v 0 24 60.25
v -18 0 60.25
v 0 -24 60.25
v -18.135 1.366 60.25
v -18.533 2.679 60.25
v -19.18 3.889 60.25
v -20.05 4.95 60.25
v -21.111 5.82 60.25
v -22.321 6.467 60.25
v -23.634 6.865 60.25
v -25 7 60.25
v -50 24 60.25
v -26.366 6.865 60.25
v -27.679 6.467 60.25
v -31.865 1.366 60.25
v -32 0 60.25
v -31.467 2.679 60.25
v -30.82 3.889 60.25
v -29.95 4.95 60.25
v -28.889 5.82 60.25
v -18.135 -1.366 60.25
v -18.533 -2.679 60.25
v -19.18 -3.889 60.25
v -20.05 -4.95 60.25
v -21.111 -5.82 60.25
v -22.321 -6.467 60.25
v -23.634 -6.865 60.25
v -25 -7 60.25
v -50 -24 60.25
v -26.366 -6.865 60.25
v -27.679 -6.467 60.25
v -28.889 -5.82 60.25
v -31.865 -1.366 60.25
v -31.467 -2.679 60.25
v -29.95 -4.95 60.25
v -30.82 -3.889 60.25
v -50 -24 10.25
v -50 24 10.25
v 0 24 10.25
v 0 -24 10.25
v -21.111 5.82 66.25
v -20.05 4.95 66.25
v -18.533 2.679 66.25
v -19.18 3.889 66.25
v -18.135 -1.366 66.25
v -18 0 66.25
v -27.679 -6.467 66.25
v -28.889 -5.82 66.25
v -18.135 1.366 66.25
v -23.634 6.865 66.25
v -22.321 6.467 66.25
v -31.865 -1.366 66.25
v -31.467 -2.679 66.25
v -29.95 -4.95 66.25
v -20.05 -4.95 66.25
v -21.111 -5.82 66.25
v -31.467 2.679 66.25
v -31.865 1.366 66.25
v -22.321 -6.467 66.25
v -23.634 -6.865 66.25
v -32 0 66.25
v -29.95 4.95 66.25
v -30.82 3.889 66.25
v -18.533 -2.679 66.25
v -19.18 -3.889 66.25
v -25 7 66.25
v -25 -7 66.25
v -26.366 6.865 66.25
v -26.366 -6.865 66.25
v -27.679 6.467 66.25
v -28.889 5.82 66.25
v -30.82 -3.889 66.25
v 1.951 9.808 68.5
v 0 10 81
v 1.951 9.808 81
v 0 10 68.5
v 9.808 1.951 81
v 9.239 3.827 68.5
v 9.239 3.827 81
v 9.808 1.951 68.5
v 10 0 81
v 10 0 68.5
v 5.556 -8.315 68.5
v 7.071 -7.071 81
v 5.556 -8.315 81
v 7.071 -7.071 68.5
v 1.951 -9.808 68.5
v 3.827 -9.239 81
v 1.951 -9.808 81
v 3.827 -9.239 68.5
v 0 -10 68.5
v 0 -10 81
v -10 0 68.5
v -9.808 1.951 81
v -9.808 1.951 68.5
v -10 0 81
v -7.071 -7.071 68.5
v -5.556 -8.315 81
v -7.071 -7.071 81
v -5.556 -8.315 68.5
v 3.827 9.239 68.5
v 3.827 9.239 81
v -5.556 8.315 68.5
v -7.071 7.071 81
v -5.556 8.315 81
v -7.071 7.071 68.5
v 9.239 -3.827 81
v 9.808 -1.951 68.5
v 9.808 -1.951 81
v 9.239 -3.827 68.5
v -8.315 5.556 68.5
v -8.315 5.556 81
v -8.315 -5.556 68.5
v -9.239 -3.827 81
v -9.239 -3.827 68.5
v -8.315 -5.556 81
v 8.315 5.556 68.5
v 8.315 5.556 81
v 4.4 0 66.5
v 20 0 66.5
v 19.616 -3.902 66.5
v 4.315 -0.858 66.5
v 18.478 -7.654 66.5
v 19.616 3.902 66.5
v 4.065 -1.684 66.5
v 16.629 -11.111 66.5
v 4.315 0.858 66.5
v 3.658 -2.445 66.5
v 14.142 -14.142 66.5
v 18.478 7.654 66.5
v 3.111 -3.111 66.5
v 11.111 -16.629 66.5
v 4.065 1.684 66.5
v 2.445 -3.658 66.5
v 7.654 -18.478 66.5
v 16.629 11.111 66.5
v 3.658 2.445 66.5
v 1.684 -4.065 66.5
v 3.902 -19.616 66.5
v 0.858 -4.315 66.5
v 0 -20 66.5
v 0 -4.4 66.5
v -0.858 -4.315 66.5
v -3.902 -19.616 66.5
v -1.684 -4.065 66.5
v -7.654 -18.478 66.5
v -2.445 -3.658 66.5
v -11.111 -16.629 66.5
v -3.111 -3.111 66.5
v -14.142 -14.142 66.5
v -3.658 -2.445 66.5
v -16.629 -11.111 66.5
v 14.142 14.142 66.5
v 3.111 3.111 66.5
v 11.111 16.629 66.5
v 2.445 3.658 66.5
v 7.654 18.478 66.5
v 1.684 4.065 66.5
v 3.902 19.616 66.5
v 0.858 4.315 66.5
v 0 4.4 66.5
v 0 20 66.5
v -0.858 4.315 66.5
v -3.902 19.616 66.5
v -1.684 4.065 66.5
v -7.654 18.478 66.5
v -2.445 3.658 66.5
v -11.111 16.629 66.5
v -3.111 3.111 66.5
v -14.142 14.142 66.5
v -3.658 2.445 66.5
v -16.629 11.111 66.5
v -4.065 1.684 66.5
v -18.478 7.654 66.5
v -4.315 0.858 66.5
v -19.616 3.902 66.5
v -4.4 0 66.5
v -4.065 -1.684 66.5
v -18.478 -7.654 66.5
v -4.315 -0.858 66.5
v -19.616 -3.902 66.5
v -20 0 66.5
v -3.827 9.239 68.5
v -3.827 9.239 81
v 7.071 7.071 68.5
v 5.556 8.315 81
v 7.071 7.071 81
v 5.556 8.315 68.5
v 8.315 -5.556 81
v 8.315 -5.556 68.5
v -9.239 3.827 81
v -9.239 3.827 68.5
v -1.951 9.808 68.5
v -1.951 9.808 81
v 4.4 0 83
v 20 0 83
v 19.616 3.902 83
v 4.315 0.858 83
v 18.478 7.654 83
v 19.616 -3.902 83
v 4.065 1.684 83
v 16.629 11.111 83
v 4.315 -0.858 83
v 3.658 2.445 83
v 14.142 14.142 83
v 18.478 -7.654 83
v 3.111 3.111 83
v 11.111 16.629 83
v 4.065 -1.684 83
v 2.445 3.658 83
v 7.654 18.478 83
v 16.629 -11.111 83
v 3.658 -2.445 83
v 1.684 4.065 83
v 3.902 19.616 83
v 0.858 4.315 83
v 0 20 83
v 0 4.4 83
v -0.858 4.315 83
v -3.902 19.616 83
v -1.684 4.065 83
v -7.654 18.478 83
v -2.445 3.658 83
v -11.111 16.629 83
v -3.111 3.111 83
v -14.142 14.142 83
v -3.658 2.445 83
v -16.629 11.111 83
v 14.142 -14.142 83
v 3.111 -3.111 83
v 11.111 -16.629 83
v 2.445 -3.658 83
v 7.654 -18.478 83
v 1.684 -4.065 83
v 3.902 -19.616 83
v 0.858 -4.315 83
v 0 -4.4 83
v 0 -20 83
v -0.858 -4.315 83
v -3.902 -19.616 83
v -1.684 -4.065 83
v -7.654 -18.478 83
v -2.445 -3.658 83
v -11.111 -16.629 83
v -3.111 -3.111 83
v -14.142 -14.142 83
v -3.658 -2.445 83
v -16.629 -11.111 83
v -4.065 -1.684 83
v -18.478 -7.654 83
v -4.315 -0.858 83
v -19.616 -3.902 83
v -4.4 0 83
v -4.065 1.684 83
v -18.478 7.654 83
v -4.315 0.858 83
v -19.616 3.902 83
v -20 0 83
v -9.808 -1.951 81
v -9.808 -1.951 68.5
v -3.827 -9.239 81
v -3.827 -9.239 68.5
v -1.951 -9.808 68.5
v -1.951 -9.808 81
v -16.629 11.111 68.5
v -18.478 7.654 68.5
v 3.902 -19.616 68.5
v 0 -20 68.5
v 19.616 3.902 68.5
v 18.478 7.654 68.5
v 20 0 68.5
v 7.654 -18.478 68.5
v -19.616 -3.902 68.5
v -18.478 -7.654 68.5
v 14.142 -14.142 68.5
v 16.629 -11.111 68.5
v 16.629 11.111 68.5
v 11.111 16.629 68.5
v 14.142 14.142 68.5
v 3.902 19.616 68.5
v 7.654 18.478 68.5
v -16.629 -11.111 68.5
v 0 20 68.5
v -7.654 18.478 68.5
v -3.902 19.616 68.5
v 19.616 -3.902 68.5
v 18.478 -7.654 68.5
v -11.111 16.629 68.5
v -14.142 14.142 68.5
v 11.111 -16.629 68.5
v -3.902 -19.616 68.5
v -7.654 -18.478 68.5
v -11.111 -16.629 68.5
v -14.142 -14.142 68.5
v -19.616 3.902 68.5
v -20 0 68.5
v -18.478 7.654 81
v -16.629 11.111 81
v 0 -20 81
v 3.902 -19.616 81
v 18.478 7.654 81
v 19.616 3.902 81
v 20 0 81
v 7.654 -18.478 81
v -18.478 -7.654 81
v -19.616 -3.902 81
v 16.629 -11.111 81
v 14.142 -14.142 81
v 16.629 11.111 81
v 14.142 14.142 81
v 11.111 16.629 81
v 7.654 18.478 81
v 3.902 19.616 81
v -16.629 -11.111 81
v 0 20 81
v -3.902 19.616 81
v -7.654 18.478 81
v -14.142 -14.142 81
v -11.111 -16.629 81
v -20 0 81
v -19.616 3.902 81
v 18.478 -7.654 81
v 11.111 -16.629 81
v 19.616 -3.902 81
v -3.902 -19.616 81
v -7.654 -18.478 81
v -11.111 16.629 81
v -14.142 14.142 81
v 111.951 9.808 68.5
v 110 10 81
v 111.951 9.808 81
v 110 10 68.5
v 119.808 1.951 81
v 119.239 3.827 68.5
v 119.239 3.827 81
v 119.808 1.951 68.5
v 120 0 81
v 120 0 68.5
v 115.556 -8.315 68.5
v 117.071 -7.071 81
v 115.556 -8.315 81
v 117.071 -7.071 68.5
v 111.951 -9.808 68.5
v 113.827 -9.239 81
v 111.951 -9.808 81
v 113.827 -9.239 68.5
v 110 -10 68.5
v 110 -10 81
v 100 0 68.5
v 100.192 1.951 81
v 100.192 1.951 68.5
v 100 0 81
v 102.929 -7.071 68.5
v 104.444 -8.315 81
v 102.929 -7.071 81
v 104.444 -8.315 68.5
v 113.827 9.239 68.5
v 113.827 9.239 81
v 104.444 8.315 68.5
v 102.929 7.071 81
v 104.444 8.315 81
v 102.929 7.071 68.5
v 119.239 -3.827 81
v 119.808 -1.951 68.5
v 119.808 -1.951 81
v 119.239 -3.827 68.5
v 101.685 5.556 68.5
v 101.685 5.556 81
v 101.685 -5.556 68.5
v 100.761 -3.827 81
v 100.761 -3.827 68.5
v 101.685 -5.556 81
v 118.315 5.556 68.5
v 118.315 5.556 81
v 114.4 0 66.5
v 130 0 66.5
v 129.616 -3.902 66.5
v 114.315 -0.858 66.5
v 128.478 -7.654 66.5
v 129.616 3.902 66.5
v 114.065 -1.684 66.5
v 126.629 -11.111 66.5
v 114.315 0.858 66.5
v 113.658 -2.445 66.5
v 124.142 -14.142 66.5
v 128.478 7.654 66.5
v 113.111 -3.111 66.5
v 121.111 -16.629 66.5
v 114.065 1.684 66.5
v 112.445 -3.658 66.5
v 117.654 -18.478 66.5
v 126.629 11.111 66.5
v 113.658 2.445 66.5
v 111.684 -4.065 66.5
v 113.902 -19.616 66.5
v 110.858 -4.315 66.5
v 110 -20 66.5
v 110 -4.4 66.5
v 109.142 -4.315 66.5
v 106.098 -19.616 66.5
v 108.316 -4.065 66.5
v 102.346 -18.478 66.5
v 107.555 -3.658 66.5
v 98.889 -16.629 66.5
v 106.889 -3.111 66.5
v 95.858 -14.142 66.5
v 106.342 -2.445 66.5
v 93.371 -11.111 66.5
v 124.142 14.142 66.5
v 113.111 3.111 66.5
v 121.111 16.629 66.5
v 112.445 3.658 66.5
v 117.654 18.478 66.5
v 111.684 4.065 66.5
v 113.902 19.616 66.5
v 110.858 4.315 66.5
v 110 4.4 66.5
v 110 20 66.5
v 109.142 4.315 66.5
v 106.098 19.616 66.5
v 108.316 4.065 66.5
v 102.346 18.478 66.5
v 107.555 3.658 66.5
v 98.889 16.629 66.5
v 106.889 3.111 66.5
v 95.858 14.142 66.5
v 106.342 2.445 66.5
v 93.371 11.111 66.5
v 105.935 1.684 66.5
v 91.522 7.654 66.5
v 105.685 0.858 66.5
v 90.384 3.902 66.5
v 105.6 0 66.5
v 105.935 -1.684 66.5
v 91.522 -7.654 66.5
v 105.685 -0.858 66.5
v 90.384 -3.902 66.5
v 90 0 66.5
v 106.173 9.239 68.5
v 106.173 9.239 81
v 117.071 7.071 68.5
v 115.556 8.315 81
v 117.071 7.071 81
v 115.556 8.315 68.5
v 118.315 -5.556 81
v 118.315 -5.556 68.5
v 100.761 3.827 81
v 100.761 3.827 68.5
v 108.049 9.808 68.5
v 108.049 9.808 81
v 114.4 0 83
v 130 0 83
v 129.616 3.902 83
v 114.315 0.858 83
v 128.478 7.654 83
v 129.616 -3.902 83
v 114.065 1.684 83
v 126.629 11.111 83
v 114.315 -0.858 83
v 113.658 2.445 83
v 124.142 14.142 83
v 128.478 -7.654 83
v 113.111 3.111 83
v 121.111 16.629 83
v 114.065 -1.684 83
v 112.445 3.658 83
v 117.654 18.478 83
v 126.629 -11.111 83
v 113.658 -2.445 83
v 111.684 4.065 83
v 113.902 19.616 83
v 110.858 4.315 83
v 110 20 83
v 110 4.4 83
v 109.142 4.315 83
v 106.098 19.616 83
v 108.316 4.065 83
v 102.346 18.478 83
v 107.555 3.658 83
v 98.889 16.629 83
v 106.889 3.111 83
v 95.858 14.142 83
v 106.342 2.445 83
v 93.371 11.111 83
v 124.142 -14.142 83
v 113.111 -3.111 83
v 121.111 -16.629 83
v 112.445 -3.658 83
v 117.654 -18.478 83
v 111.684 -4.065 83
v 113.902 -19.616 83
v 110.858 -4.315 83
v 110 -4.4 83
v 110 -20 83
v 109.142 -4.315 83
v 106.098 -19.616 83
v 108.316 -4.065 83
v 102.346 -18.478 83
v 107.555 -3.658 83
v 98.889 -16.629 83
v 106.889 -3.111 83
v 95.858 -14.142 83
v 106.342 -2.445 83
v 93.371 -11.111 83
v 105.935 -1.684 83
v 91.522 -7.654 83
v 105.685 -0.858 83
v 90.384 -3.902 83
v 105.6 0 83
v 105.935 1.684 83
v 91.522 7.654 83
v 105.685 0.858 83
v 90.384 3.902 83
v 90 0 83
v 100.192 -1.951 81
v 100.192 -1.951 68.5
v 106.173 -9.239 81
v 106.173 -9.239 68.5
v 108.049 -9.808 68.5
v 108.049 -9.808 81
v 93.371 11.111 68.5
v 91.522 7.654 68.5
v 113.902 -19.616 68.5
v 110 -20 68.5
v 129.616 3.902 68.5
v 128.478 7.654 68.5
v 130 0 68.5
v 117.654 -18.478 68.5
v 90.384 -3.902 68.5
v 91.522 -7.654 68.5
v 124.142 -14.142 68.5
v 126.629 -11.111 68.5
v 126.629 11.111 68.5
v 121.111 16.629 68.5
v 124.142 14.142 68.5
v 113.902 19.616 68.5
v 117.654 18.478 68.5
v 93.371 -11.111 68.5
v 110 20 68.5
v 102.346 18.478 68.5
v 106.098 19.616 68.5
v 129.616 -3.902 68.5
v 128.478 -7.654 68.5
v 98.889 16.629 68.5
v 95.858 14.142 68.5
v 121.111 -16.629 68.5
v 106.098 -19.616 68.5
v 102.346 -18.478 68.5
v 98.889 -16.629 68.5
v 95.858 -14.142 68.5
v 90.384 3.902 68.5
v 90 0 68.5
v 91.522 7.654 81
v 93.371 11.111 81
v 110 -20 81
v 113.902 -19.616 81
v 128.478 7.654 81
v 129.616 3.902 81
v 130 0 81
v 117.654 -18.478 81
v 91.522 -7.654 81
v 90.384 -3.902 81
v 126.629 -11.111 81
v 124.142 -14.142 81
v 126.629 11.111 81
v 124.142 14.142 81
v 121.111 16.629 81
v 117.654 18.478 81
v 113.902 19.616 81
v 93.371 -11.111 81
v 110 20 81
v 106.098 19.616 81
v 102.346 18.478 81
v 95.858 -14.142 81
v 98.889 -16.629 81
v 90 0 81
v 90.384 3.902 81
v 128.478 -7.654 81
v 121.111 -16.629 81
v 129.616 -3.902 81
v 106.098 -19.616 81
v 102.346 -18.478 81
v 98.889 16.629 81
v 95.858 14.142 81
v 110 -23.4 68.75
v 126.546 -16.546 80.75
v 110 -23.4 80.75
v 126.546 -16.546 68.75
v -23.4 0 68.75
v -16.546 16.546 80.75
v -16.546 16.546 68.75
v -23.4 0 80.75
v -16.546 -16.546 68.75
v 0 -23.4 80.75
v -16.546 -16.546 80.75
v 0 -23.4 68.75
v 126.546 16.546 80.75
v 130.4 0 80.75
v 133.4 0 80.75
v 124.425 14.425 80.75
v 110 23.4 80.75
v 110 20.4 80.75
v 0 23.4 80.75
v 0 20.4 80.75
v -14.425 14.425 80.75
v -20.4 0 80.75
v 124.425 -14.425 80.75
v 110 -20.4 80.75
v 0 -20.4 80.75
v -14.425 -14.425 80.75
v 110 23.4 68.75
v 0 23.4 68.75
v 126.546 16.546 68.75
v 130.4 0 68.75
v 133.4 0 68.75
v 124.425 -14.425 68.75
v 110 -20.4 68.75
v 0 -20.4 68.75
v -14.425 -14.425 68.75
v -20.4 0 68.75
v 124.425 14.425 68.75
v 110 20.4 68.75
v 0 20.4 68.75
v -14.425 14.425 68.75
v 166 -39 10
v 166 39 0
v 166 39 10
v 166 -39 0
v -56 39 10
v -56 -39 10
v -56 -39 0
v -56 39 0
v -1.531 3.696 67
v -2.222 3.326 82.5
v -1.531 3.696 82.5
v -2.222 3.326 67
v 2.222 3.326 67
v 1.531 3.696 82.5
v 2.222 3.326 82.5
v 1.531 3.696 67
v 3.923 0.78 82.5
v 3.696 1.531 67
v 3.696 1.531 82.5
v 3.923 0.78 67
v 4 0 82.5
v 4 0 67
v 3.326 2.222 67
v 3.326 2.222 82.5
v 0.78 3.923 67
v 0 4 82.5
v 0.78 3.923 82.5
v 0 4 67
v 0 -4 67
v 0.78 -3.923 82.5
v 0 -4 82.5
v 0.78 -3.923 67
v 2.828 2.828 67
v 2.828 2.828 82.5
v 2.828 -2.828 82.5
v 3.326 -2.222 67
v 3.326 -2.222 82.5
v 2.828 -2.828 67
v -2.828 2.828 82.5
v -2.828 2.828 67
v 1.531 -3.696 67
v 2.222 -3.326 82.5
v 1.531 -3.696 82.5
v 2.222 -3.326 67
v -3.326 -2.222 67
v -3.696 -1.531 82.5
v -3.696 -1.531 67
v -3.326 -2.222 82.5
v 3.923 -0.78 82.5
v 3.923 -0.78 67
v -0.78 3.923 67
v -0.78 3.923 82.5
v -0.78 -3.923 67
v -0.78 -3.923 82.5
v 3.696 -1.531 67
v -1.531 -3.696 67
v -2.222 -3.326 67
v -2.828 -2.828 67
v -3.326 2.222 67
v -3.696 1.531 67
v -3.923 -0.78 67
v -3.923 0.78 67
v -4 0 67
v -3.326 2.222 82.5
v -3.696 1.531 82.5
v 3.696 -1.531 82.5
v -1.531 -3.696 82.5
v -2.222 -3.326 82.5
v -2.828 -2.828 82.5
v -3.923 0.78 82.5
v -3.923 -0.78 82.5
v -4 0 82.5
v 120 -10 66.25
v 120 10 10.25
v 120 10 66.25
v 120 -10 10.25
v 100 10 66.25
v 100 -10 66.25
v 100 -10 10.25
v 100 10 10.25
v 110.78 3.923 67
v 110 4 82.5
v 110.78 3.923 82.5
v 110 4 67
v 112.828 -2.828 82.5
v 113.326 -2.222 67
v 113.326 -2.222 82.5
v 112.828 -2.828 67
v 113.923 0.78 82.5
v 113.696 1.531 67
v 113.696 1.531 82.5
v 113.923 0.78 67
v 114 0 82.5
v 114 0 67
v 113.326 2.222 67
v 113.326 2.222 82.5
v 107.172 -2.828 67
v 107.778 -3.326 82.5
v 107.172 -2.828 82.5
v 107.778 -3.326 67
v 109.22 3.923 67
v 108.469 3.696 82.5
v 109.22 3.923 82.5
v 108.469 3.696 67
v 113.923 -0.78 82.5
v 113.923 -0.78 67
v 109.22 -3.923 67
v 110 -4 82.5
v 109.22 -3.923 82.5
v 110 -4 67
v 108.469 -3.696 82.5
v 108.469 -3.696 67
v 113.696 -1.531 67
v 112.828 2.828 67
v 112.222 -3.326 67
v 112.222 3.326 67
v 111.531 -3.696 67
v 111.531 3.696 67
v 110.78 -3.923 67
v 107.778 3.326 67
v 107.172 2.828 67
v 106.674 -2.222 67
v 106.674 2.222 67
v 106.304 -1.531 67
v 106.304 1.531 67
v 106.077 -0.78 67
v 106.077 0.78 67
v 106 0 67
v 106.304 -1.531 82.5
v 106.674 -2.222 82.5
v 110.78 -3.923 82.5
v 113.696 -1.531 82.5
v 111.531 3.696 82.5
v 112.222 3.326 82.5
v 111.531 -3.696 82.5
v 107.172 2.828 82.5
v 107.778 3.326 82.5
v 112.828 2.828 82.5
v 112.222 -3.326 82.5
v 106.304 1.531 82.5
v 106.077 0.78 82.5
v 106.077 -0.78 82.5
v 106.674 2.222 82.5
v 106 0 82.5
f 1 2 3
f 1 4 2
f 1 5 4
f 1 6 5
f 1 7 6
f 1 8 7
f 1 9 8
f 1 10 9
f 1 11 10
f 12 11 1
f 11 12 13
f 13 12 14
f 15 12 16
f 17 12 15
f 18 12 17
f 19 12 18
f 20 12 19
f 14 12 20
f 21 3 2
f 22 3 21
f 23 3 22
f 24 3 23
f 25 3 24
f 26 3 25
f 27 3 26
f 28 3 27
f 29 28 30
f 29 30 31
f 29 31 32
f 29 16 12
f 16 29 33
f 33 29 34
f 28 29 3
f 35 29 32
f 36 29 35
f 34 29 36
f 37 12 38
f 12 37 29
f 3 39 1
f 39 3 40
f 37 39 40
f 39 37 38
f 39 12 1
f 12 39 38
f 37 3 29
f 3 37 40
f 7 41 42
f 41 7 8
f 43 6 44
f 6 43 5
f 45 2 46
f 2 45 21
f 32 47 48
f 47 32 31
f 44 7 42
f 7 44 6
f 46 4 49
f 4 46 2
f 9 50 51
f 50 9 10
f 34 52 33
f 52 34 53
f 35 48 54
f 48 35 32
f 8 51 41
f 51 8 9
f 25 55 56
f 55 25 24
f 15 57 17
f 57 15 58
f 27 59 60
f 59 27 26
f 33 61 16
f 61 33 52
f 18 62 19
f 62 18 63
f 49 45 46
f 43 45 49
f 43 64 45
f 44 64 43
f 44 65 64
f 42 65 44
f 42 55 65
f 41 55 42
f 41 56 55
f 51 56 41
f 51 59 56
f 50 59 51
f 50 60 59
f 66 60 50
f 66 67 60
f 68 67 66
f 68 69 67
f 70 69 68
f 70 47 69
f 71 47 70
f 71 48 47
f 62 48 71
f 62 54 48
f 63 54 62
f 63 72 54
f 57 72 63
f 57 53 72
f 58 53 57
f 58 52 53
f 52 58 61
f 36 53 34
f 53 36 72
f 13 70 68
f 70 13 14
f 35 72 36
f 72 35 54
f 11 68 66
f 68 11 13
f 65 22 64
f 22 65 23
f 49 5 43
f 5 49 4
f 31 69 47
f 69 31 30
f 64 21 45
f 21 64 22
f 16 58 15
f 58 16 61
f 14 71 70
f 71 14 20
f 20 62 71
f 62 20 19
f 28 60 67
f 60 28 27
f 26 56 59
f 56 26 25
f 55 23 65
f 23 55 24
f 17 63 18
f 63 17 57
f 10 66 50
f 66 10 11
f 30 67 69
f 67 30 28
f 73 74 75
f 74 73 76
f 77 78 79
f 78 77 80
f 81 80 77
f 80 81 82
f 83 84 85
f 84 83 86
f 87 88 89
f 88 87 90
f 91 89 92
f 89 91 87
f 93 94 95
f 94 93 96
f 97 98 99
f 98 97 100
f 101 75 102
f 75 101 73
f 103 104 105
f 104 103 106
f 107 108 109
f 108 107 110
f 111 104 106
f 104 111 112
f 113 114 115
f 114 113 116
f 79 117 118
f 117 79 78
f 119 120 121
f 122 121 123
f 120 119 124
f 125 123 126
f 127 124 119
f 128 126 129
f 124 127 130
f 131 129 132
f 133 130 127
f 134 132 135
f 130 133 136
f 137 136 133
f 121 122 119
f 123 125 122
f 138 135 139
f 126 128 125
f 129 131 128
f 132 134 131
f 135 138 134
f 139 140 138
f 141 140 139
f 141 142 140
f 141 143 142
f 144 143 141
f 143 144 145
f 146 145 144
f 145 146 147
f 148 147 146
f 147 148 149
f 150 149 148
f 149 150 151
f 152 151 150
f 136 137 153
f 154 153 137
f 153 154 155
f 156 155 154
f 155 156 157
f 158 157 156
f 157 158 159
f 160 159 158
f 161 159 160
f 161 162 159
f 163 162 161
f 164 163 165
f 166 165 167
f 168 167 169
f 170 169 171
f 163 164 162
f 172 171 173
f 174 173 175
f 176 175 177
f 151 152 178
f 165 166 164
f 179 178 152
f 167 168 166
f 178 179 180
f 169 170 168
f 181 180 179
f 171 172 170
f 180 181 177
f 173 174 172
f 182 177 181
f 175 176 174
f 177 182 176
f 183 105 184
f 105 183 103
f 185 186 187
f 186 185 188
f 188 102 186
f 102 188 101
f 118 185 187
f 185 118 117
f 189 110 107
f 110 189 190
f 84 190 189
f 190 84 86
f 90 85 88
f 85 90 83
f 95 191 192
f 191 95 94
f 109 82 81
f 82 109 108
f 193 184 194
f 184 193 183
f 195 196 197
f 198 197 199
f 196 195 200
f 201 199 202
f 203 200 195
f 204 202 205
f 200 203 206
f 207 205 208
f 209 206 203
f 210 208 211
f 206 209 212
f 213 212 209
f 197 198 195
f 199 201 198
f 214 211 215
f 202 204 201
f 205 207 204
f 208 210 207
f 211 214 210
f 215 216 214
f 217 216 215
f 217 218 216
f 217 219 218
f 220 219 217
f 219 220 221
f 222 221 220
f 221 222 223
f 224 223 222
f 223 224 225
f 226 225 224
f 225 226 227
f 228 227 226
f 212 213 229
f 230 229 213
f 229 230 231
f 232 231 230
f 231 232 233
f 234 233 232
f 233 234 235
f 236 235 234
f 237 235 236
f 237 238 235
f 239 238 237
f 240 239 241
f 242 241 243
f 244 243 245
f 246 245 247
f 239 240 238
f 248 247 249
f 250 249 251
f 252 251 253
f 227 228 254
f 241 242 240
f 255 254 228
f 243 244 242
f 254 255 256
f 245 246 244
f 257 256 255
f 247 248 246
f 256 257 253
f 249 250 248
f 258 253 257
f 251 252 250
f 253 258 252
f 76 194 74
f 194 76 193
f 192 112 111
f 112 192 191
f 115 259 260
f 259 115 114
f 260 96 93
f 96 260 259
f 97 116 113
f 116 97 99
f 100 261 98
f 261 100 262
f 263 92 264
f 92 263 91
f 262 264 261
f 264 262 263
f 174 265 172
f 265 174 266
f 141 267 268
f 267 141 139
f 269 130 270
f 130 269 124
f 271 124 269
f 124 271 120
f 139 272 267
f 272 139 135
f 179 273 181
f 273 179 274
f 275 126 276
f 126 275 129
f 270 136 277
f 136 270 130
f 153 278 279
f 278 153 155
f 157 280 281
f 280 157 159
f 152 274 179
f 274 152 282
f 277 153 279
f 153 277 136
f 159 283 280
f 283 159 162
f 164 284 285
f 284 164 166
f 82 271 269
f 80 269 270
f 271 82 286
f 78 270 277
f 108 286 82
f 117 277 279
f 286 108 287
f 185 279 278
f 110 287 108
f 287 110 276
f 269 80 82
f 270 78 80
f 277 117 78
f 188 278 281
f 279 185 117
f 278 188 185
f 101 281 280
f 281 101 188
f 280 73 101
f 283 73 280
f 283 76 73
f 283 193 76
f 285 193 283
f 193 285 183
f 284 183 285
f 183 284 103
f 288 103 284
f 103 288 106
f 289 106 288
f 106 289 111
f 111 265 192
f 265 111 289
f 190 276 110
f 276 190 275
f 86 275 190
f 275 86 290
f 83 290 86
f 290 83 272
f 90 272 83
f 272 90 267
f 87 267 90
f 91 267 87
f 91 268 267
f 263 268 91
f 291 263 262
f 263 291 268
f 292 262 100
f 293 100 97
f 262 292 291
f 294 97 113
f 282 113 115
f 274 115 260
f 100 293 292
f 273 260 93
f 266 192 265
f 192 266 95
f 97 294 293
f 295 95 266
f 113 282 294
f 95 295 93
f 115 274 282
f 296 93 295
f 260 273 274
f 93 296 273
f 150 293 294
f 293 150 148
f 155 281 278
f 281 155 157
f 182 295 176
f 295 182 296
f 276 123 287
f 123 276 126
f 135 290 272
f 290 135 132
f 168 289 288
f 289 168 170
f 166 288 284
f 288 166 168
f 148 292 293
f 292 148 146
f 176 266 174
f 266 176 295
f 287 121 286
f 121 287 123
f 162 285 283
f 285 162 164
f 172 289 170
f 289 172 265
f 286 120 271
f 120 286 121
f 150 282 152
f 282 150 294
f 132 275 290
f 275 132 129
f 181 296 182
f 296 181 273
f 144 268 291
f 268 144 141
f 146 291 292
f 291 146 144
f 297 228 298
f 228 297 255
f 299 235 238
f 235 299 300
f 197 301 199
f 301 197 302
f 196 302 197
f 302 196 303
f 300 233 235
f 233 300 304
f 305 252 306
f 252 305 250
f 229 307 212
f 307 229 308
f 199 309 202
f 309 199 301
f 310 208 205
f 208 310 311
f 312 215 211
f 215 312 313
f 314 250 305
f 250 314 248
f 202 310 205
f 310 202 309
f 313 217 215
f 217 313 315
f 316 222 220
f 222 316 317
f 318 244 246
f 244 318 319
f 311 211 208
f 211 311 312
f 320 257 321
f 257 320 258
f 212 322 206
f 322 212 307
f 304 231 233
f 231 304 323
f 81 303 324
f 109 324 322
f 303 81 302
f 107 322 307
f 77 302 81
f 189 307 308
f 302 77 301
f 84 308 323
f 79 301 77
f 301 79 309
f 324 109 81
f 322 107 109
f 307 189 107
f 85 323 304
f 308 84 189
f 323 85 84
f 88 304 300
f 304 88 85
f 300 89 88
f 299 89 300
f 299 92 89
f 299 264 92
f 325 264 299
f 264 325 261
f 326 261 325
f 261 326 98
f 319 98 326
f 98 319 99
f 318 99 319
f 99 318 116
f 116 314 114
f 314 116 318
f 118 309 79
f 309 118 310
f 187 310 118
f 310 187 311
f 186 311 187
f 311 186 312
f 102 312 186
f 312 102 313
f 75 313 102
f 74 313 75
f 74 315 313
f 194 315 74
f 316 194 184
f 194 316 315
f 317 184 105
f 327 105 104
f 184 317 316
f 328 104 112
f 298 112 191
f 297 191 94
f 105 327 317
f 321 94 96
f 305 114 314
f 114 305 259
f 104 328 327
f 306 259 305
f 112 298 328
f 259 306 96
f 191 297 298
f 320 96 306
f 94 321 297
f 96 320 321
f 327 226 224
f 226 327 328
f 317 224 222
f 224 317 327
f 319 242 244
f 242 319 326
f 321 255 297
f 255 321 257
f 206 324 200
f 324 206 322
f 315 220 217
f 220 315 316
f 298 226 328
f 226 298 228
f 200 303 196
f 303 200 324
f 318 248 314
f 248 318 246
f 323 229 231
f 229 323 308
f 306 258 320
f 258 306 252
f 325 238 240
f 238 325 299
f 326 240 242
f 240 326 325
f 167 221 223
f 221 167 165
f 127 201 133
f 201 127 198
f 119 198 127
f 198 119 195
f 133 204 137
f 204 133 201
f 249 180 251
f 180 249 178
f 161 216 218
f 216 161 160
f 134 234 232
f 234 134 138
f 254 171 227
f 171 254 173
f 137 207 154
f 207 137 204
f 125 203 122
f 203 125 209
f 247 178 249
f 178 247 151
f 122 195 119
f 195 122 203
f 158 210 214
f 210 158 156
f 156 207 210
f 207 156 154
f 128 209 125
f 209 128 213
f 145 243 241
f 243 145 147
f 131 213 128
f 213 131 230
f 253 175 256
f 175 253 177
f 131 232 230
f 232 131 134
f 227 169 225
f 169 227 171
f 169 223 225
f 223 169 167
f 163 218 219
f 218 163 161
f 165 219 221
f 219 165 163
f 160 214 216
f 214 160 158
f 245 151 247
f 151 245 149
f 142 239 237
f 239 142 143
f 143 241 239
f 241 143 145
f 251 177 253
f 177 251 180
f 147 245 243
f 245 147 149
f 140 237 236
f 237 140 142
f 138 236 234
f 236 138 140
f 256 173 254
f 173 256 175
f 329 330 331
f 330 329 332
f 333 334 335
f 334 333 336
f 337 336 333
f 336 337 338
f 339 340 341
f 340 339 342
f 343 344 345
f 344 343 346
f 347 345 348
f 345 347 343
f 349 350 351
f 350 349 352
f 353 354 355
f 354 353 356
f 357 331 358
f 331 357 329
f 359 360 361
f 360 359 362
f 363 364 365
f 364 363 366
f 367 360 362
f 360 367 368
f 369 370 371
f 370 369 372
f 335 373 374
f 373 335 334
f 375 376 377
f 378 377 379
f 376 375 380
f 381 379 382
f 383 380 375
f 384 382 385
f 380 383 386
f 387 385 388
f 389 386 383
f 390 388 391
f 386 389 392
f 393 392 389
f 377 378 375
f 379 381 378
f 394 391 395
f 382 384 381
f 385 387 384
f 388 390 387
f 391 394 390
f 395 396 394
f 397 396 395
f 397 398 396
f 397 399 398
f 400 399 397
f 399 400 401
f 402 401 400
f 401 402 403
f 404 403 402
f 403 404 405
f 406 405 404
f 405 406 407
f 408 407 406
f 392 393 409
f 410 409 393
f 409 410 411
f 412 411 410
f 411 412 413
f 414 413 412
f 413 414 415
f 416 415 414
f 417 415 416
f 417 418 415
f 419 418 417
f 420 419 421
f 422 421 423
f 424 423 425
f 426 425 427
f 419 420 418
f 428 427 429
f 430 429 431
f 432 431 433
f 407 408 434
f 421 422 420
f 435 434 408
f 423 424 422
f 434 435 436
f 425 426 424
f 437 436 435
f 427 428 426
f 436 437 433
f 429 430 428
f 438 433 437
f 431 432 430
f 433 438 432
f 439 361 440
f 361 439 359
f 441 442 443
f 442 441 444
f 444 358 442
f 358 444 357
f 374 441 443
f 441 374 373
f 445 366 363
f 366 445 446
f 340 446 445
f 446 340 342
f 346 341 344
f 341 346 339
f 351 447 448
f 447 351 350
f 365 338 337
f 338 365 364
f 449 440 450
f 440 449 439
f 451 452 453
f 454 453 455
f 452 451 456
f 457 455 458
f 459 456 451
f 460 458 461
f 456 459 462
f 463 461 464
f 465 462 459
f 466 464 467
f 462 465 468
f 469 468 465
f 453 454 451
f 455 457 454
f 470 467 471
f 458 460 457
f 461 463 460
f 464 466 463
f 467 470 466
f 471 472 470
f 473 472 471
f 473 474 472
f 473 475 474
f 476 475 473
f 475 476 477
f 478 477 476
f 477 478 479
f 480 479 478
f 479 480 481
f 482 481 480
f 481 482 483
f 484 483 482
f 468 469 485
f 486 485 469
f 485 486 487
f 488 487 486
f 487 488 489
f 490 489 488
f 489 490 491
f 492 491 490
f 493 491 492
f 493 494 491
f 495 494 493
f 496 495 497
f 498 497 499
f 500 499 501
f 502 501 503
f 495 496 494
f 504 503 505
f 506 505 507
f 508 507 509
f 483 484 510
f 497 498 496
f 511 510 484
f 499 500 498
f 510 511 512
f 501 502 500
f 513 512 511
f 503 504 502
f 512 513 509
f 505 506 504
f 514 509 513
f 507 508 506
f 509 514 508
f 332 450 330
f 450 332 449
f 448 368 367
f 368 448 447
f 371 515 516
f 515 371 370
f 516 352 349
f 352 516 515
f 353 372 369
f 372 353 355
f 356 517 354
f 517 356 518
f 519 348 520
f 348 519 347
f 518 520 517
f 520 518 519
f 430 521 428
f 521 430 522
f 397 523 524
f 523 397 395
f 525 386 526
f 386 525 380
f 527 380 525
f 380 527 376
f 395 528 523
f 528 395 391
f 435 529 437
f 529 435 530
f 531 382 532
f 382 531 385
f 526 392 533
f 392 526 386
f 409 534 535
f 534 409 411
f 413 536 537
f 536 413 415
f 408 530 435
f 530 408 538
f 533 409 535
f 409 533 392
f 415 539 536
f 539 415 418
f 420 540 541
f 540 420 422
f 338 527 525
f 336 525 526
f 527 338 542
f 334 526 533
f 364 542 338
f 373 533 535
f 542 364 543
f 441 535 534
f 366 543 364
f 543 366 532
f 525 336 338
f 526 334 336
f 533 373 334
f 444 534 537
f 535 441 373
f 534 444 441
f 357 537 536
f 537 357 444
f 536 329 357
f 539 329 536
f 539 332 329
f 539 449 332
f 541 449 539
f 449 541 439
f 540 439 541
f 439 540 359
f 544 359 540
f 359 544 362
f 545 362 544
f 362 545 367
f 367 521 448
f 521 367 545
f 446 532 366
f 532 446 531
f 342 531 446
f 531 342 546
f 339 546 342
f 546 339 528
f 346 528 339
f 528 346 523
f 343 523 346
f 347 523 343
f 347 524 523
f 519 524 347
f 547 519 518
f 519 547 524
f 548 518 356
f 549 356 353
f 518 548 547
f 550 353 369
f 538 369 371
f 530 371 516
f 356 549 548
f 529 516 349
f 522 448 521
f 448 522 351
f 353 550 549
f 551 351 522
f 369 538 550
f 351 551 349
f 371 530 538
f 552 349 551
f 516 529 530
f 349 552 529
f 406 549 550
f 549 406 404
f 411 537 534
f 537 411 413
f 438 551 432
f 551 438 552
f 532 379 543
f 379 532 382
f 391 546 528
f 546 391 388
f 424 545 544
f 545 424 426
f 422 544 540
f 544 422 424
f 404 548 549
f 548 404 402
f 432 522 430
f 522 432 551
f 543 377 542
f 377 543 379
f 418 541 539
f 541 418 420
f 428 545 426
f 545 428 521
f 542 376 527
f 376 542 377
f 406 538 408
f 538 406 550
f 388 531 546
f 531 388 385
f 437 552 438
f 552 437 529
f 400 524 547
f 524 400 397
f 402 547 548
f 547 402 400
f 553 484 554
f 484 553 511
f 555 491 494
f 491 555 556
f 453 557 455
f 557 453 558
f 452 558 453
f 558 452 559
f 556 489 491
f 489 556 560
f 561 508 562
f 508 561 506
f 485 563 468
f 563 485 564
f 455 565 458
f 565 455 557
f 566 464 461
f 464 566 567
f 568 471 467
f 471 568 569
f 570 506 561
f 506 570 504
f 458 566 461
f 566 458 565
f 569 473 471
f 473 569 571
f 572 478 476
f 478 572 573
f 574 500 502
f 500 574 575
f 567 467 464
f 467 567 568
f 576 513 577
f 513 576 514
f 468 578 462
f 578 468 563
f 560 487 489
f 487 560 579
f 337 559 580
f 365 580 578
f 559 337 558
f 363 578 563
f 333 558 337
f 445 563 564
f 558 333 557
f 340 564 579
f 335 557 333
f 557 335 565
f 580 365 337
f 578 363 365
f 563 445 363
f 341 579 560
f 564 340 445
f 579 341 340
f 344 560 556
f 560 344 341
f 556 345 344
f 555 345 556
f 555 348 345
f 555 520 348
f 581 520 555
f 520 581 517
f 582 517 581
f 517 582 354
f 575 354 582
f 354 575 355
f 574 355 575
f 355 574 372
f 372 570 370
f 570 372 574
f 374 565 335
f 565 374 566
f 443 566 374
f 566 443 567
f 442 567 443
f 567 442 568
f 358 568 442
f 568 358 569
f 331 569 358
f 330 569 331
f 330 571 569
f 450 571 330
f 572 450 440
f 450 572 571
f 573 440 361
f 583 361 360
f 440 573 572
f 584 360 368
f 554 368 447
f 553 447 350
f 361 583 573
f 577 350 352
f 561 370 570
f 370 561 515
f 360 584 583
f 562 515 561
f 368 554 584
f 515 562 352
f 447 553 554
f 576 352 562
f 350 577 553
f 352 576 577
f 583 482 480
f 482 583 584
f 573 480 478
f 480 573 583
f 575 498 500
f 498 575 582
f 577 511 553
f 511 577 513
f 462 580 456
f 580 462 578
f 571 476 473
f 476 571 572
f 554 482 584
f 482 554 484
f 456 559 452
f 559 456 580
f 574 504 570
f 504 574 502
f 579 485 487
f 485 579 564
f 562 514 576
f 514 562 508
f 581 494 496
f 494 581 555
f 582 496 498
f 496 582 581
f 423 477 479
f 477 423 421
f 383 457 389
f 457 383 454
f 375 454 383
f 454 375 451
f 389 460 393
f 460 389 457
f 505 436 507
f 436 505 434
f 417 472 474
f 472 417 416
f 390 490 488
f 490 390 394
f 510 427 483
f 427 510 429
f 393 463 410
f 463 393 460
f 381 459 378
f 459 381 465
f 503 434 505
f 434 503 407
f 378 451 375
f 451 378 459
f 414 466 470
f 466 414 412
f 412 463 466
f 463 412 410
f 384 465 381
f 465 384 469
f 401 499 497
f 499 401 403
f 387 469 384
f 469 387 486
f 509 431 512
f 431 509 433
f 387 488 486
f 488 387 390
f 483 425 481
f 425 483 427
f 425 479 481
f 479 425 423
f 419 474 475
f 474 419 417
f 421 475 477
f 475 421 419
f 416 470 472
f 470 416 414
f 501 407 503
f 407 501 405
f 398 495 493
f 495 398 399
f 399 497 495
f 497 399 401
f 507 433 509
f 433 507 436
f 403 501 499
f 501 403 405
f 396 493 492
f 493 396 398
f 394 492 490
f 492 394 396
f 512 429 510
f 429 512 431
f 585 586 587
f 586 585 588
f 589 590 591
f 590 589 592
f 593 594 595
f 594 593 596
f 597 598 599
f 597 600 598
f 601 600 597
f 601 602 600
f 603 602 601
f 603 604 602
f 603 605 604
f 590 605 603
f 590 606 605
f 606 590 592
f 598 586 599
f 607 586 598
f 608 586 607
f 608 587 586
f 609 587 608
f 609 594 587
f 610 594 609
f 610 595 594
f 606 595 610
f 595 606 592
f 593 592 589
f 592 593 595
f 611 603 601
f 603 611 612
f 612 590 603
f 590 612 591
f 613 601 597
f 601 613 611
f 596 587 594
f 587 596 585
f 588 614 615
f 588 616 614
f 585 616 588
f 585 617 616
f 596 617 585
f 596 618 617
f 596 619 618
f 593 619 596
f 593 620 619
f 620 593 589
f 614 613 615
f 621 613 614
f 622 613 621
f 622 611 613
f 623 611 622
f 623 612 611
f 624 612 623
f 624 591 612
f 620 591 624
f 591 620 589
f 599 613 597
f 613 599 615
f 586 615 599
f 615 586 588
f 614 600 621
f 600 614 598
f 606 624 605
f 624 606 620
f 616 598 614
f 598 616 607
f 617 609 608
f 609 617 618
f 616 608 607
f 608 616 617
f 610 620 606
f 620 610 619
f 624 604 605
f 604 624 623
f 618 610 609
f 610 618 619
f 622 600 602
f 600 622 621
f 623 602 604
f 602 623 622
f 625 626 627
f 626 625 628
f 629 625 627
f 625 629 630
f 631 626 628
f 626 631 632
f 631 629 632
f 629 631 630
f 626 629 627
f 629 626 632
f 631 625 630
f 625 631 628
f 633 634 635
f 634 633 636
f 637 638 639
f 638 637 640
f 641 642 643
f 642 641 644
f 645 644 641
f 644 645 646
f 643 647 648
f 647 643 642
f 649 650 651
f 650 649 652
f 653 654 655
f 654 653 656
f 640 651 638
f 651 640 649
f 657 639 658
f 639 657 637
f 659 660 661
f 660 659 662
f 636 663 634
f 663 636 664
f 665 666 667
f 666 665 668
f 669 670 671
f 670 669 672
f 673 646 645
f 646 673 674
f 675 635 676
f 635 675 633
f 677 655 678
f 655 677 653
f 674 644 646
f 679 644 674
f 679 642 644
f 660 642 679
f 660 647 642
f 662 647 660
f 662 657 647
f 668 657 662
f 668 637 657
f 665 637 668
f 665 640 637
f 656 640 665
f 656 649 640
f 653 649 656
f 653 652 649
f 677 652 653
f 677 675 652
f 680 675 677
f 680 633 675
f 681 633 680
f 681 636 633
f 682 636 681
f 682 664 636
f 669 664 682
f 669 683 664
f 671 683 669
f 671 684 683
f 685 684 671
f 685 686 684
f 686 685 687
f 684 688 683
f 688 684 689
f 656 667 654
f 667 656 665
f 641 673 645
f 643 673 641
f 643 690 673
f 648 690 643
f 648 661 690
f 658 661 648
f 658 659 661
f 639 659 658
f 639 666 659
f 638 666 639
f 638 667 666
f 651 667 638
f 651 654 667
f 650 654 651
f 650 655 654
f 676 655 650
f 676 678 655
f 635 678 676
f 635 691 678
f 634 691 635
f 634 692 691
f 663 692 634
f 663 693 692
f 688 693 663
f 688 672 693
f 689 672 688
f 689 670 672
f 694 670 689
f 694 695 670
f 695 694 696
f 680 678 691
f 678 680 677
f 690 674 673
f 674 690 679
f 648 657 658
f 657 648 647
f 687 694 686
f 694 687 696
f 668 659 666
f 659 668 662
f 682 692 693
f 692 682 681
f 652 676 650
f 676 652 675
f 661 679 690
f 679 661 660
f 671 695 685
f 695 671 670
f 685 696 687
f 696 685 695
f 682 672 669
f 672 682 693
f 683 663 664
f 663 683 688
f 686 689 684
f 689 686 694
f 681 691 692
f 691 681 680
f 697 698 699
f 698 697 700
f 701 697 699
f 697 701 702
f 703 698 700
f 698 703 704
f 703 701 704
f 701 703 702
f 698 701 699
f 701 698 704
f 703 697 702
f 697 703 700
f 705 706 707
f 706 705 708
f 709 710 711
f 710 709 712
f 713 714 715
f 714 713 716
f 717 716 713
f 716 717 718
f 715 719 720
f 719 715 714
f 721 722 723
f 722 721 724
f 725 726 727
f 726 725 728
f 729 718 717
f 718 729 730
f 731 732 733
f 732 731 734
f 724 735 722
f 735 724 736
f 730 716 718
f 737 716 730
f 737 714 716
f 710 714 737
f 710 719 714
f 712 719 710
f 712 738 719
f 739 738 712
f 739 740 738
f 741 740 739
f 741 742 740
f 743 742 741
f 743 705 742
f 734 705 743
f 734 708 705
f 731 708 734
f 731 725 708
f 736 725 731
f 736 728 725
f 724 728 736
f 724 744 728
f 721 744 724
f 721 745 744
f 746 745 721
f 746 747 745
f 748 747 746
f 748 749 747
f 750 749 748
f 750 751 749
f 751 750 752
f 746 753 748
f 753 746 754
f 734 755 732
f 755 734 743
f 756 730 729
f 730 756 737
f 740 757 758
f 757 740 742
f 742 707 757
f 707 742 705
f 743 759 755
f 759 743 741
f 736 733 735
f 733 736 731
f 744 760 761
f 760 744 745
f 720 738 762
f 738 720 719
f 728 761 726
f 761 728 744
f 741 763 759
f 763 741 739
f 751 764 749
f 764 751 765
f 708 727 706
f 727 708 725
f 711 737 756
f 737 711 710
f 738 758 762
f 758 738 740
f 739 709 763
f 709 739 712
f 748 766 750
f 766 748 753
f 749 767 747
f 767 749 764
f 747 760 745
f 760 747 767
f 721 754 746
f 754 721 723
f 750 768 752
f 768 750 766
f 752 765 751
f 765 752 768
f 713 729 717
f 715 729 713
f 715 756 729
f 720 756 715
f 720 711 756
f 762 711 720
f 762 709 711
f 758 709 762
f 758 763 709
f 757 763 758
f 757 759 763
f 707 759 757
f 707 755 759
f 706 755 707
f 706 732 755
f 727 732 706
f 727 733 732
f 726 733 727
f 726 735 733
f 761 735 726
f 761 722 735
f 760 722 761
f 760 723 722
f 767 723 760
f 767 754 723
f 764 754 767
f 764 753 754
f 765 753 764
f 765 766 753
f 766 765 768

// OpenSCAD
$fn = 32;

// ------------------------------------------------------------------------
// Motor belt drive: span 110 mm, pulleys d40, belt 12 mm wide
// Every part is its own module, assembly() places every instance.
// ------------------------------------------------------------------------

// --- part 1 ---
module base_plate() {
  difference() {
    translate([-111, -39, 0]) cube([222, 78, 10]);
  }
}

// --- part 2 ---
module motor() {
  union() {
    translate([-25, -24, 0]) cube([50, 48, 50]);
    translate([28, 0, 25]) rotate([0, 90, 0]) cylinder(h = 6, d = 14, center = true);
  }
}

// --- part 3 ---
module drive_shaft() {
  translate([0, 0, -7.75]) cylinder(h = 15.5, d = 8);
}

// --- part 4 ---
module pulley_drive() {
  difference() {
    union() {
      cylinder(h = 16.5, d = 20);
      cylinder(h = 2, d = 40);
      translate([0, 0, 14.5]) cylinder(h = 2, d = 40);
    }
    translate([0, 0, -1]) cylinder(h = 18.5, d = 8.8);
  }
}

// --- part 5 ---
module idler_post() {
  translate([-10, -10, 0]) cube([20, 20, 56]);
}

// --- part 6 ---
module driven_shaft() {
  translate([0, 0, -7.75]) cylinder(h = 15.5, d = 8);
}

// --- part 7 ---
module pulley_driven() {
  difference() {
    union() {
      cylinder(h = 16.5, d = 20);
      cylinder(h = 2, d = 40);
      translate([0, 0, 14.5]) cylinder(h = 2, d = 40);
    }
    translate([0, 0, -1]) cylinder(h = 18.5, d = 8.8);
  }
}

// --- part 8 ---
module drive_belt() {
  difference() {
    linear_extrude(height = 12) polygon(points = concat([for (a = [90 : 45 : 270]) [23.4 * cos(a), 23.4 * sin(a)]], [for (a = [270 : 45 : 450]) [110 + 23.4 * cos(a), 23.4 * sin(a)]]));
    translate([0, 0, -1]) linear_extrude(height = 14) polygon(points = concat([for (a = [90 : 45 : 270]) [20.4 * cos(a), 20.4 * sin(a)]], [for (a = [270 : 45 : 450]) [110 + 20.4 * cos(a), 20.4 * sin(a)]]));
  }
}

// --- assembly ---
module assembly() {
  color([0.80, 0.24, 0.20]) translate([55, 0, 0]) rotate([0, 0, 0]) base_plate();
  color([0.20, 0.45, 0.75]) translate([0, 0, 35.25]) rotate([0, 270, 0]) motor();
  color([0.25, 0.62, 0.32]) translate([0, 0, 74.75]) rotate([0, 0, 0]) drive_shaft();
  color([0.92, 0.70, 0.18]) translate([0, 0, 66.5]) rotate([0, 0, 0]) pulley_drive();
  color([0.58, 0.35, 0.70]) translate([110, 0, 10.25]) rotate([0, 0, 0]) idler_post();
  color([0.16, 0.66, 0.66]) translate([110, 0, 74.75]) rotate([0, 0, 0]) driven_shaft();
  color([0.85, 0.48, 0.18]) translate([110, 0, 66.5]) rotate([0, 0, 0]) pulley_driven();
  color([0.55, 0.60, 0.65]) translate([0, 0, 68.75]) rotate([0, 0, 0]) drive_belt();
}

assembly();
